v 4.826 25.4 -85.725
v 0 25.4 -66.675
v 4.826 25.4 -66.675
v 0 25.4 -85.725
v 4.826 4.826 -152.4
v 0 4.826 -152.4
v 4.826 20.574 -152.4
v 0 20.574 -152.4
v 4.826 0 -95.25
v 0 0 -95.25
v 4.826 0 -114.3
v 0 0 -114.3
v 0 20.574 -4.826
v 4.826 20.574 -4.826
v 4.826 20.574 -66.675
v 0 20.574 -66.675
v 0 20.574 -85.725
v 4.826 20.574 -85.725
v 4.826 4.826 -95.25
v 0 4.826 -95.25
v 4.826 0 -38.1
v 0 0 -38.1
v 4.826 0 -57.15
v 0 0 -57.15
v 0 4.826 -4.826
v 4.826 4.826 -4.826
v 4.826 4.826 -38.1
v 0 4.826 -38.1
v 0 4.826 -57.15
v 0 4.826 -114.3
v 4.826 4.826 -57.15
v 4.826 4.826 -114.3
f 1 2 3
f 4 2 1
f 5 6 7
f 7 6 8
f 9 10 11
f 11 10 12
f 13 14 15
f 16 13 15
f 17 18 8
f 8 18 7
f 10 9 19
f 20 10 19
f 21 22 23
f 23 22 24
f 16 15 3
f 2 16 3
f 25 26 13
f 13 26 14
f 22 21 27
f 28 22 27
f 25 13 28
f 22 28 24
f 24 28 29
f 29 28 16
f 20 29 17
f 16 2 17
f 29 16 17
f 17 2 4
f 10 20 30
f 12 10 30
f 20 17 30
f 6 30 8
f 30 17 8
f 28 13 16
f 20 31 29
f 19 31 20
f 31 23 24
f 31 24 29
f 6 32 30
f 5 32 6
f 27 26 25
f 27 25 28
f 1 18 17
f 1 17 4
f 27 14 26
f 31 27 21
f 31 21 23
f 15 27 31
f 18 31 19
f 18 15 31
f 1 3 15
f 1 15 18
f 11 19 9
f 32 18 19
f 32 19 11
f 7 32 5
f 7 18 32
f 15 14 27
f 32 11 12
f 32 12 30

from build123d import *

# Parameters (mm, degrees)
SKETCH1_W               = 152.4
SKETCH1_H               = 25.4
BOSS_EXTRUDE1_DEPTH     = 4.826
SKETCH2_W               = 38.1
SKETCH2_H               = 4.826
BOTTOM_EDGE_SLOTS_DEPTH = 155.577521898
SKETCH4_W               = 66.675
SKETCH4_H               = 4.826
TOP_EDGE_SLOT_DEPTH     = 155.577521898
SKETCH6_W               = 4.826
SKETCH6_H               = 15.748
LEADING_EDGE_CUT_DEPTH  = 155.577521898


with BuildPart() as part:
    # Sketch1 → Boss-Extrude1 (new body)
    with BuildSketch(Plane(origin=(0, 0, 0), x_dir=(0, 0, -1), z_dir=(1, 0, 0))):
        with Locations((76.2, 12.7)):
            Rectangle(SKETCH1_W, SKETCH1_H)
    extrude(amount=BOSS_EXTRUDE1_DEPTH)

    # Sketch2 → Bottom Edge Slots (cut, through all)
    with BuildSketch(Plane(origin=(4.826, 0, 0), x_dir=(0, 0, -1), z_dir=(1, 0, 0))):
        with Locations((19.05, 2.413)):
            Rectangle(SKETCH2_W, SKETCH2_H)
        with Locations((76.2, 2.413)):
            Rectangle(SKETCH2_W, SKETCH2_H)
        with Locations((133.35, 2.413)):
            Rectangle(SKETCH2_W, SKETCH2_H)
    extrude(amount=-BOTTOM_EDGE_SLOTS_DEPTH, mode=Mode.SUBTRACT)

    # Sketch4 → Top Edge Slot (cut, through all)
    with BuildSketch(Plane(origin=(4.826, 0, 0), x_dir=(0, 0, -1), z_dir=(1, 0, 0))):
        with Locations((33.3375, 22.987)):
            Rectangle(SKETCH4_W, SKETCH4_H)
        with Locations((119.0625, 22.987)):
            Rectangle(SKETCH4_W, SKETCH4_H)
    extrude(amount=-TOP_EDGE_SLOT_DEPTH, mode=Mode.SUBTRACT)

    # Sketch6 → Leading Edge Cut (cut, through all)
    with BuildSketch(Plane(origin=(4.826, 0, 0), x_dir=(0, 0, -1), z_dir=(1, 0, 0))):
        with Locations((2.413, 12.7)):
            Rectangle(SKETCH6_W, SKETCH6_H)
    extrude(amount=-LEADING_EDGE_CUT_DEPTH, mode=Mode.SUBTRACT)


solid = part.part
